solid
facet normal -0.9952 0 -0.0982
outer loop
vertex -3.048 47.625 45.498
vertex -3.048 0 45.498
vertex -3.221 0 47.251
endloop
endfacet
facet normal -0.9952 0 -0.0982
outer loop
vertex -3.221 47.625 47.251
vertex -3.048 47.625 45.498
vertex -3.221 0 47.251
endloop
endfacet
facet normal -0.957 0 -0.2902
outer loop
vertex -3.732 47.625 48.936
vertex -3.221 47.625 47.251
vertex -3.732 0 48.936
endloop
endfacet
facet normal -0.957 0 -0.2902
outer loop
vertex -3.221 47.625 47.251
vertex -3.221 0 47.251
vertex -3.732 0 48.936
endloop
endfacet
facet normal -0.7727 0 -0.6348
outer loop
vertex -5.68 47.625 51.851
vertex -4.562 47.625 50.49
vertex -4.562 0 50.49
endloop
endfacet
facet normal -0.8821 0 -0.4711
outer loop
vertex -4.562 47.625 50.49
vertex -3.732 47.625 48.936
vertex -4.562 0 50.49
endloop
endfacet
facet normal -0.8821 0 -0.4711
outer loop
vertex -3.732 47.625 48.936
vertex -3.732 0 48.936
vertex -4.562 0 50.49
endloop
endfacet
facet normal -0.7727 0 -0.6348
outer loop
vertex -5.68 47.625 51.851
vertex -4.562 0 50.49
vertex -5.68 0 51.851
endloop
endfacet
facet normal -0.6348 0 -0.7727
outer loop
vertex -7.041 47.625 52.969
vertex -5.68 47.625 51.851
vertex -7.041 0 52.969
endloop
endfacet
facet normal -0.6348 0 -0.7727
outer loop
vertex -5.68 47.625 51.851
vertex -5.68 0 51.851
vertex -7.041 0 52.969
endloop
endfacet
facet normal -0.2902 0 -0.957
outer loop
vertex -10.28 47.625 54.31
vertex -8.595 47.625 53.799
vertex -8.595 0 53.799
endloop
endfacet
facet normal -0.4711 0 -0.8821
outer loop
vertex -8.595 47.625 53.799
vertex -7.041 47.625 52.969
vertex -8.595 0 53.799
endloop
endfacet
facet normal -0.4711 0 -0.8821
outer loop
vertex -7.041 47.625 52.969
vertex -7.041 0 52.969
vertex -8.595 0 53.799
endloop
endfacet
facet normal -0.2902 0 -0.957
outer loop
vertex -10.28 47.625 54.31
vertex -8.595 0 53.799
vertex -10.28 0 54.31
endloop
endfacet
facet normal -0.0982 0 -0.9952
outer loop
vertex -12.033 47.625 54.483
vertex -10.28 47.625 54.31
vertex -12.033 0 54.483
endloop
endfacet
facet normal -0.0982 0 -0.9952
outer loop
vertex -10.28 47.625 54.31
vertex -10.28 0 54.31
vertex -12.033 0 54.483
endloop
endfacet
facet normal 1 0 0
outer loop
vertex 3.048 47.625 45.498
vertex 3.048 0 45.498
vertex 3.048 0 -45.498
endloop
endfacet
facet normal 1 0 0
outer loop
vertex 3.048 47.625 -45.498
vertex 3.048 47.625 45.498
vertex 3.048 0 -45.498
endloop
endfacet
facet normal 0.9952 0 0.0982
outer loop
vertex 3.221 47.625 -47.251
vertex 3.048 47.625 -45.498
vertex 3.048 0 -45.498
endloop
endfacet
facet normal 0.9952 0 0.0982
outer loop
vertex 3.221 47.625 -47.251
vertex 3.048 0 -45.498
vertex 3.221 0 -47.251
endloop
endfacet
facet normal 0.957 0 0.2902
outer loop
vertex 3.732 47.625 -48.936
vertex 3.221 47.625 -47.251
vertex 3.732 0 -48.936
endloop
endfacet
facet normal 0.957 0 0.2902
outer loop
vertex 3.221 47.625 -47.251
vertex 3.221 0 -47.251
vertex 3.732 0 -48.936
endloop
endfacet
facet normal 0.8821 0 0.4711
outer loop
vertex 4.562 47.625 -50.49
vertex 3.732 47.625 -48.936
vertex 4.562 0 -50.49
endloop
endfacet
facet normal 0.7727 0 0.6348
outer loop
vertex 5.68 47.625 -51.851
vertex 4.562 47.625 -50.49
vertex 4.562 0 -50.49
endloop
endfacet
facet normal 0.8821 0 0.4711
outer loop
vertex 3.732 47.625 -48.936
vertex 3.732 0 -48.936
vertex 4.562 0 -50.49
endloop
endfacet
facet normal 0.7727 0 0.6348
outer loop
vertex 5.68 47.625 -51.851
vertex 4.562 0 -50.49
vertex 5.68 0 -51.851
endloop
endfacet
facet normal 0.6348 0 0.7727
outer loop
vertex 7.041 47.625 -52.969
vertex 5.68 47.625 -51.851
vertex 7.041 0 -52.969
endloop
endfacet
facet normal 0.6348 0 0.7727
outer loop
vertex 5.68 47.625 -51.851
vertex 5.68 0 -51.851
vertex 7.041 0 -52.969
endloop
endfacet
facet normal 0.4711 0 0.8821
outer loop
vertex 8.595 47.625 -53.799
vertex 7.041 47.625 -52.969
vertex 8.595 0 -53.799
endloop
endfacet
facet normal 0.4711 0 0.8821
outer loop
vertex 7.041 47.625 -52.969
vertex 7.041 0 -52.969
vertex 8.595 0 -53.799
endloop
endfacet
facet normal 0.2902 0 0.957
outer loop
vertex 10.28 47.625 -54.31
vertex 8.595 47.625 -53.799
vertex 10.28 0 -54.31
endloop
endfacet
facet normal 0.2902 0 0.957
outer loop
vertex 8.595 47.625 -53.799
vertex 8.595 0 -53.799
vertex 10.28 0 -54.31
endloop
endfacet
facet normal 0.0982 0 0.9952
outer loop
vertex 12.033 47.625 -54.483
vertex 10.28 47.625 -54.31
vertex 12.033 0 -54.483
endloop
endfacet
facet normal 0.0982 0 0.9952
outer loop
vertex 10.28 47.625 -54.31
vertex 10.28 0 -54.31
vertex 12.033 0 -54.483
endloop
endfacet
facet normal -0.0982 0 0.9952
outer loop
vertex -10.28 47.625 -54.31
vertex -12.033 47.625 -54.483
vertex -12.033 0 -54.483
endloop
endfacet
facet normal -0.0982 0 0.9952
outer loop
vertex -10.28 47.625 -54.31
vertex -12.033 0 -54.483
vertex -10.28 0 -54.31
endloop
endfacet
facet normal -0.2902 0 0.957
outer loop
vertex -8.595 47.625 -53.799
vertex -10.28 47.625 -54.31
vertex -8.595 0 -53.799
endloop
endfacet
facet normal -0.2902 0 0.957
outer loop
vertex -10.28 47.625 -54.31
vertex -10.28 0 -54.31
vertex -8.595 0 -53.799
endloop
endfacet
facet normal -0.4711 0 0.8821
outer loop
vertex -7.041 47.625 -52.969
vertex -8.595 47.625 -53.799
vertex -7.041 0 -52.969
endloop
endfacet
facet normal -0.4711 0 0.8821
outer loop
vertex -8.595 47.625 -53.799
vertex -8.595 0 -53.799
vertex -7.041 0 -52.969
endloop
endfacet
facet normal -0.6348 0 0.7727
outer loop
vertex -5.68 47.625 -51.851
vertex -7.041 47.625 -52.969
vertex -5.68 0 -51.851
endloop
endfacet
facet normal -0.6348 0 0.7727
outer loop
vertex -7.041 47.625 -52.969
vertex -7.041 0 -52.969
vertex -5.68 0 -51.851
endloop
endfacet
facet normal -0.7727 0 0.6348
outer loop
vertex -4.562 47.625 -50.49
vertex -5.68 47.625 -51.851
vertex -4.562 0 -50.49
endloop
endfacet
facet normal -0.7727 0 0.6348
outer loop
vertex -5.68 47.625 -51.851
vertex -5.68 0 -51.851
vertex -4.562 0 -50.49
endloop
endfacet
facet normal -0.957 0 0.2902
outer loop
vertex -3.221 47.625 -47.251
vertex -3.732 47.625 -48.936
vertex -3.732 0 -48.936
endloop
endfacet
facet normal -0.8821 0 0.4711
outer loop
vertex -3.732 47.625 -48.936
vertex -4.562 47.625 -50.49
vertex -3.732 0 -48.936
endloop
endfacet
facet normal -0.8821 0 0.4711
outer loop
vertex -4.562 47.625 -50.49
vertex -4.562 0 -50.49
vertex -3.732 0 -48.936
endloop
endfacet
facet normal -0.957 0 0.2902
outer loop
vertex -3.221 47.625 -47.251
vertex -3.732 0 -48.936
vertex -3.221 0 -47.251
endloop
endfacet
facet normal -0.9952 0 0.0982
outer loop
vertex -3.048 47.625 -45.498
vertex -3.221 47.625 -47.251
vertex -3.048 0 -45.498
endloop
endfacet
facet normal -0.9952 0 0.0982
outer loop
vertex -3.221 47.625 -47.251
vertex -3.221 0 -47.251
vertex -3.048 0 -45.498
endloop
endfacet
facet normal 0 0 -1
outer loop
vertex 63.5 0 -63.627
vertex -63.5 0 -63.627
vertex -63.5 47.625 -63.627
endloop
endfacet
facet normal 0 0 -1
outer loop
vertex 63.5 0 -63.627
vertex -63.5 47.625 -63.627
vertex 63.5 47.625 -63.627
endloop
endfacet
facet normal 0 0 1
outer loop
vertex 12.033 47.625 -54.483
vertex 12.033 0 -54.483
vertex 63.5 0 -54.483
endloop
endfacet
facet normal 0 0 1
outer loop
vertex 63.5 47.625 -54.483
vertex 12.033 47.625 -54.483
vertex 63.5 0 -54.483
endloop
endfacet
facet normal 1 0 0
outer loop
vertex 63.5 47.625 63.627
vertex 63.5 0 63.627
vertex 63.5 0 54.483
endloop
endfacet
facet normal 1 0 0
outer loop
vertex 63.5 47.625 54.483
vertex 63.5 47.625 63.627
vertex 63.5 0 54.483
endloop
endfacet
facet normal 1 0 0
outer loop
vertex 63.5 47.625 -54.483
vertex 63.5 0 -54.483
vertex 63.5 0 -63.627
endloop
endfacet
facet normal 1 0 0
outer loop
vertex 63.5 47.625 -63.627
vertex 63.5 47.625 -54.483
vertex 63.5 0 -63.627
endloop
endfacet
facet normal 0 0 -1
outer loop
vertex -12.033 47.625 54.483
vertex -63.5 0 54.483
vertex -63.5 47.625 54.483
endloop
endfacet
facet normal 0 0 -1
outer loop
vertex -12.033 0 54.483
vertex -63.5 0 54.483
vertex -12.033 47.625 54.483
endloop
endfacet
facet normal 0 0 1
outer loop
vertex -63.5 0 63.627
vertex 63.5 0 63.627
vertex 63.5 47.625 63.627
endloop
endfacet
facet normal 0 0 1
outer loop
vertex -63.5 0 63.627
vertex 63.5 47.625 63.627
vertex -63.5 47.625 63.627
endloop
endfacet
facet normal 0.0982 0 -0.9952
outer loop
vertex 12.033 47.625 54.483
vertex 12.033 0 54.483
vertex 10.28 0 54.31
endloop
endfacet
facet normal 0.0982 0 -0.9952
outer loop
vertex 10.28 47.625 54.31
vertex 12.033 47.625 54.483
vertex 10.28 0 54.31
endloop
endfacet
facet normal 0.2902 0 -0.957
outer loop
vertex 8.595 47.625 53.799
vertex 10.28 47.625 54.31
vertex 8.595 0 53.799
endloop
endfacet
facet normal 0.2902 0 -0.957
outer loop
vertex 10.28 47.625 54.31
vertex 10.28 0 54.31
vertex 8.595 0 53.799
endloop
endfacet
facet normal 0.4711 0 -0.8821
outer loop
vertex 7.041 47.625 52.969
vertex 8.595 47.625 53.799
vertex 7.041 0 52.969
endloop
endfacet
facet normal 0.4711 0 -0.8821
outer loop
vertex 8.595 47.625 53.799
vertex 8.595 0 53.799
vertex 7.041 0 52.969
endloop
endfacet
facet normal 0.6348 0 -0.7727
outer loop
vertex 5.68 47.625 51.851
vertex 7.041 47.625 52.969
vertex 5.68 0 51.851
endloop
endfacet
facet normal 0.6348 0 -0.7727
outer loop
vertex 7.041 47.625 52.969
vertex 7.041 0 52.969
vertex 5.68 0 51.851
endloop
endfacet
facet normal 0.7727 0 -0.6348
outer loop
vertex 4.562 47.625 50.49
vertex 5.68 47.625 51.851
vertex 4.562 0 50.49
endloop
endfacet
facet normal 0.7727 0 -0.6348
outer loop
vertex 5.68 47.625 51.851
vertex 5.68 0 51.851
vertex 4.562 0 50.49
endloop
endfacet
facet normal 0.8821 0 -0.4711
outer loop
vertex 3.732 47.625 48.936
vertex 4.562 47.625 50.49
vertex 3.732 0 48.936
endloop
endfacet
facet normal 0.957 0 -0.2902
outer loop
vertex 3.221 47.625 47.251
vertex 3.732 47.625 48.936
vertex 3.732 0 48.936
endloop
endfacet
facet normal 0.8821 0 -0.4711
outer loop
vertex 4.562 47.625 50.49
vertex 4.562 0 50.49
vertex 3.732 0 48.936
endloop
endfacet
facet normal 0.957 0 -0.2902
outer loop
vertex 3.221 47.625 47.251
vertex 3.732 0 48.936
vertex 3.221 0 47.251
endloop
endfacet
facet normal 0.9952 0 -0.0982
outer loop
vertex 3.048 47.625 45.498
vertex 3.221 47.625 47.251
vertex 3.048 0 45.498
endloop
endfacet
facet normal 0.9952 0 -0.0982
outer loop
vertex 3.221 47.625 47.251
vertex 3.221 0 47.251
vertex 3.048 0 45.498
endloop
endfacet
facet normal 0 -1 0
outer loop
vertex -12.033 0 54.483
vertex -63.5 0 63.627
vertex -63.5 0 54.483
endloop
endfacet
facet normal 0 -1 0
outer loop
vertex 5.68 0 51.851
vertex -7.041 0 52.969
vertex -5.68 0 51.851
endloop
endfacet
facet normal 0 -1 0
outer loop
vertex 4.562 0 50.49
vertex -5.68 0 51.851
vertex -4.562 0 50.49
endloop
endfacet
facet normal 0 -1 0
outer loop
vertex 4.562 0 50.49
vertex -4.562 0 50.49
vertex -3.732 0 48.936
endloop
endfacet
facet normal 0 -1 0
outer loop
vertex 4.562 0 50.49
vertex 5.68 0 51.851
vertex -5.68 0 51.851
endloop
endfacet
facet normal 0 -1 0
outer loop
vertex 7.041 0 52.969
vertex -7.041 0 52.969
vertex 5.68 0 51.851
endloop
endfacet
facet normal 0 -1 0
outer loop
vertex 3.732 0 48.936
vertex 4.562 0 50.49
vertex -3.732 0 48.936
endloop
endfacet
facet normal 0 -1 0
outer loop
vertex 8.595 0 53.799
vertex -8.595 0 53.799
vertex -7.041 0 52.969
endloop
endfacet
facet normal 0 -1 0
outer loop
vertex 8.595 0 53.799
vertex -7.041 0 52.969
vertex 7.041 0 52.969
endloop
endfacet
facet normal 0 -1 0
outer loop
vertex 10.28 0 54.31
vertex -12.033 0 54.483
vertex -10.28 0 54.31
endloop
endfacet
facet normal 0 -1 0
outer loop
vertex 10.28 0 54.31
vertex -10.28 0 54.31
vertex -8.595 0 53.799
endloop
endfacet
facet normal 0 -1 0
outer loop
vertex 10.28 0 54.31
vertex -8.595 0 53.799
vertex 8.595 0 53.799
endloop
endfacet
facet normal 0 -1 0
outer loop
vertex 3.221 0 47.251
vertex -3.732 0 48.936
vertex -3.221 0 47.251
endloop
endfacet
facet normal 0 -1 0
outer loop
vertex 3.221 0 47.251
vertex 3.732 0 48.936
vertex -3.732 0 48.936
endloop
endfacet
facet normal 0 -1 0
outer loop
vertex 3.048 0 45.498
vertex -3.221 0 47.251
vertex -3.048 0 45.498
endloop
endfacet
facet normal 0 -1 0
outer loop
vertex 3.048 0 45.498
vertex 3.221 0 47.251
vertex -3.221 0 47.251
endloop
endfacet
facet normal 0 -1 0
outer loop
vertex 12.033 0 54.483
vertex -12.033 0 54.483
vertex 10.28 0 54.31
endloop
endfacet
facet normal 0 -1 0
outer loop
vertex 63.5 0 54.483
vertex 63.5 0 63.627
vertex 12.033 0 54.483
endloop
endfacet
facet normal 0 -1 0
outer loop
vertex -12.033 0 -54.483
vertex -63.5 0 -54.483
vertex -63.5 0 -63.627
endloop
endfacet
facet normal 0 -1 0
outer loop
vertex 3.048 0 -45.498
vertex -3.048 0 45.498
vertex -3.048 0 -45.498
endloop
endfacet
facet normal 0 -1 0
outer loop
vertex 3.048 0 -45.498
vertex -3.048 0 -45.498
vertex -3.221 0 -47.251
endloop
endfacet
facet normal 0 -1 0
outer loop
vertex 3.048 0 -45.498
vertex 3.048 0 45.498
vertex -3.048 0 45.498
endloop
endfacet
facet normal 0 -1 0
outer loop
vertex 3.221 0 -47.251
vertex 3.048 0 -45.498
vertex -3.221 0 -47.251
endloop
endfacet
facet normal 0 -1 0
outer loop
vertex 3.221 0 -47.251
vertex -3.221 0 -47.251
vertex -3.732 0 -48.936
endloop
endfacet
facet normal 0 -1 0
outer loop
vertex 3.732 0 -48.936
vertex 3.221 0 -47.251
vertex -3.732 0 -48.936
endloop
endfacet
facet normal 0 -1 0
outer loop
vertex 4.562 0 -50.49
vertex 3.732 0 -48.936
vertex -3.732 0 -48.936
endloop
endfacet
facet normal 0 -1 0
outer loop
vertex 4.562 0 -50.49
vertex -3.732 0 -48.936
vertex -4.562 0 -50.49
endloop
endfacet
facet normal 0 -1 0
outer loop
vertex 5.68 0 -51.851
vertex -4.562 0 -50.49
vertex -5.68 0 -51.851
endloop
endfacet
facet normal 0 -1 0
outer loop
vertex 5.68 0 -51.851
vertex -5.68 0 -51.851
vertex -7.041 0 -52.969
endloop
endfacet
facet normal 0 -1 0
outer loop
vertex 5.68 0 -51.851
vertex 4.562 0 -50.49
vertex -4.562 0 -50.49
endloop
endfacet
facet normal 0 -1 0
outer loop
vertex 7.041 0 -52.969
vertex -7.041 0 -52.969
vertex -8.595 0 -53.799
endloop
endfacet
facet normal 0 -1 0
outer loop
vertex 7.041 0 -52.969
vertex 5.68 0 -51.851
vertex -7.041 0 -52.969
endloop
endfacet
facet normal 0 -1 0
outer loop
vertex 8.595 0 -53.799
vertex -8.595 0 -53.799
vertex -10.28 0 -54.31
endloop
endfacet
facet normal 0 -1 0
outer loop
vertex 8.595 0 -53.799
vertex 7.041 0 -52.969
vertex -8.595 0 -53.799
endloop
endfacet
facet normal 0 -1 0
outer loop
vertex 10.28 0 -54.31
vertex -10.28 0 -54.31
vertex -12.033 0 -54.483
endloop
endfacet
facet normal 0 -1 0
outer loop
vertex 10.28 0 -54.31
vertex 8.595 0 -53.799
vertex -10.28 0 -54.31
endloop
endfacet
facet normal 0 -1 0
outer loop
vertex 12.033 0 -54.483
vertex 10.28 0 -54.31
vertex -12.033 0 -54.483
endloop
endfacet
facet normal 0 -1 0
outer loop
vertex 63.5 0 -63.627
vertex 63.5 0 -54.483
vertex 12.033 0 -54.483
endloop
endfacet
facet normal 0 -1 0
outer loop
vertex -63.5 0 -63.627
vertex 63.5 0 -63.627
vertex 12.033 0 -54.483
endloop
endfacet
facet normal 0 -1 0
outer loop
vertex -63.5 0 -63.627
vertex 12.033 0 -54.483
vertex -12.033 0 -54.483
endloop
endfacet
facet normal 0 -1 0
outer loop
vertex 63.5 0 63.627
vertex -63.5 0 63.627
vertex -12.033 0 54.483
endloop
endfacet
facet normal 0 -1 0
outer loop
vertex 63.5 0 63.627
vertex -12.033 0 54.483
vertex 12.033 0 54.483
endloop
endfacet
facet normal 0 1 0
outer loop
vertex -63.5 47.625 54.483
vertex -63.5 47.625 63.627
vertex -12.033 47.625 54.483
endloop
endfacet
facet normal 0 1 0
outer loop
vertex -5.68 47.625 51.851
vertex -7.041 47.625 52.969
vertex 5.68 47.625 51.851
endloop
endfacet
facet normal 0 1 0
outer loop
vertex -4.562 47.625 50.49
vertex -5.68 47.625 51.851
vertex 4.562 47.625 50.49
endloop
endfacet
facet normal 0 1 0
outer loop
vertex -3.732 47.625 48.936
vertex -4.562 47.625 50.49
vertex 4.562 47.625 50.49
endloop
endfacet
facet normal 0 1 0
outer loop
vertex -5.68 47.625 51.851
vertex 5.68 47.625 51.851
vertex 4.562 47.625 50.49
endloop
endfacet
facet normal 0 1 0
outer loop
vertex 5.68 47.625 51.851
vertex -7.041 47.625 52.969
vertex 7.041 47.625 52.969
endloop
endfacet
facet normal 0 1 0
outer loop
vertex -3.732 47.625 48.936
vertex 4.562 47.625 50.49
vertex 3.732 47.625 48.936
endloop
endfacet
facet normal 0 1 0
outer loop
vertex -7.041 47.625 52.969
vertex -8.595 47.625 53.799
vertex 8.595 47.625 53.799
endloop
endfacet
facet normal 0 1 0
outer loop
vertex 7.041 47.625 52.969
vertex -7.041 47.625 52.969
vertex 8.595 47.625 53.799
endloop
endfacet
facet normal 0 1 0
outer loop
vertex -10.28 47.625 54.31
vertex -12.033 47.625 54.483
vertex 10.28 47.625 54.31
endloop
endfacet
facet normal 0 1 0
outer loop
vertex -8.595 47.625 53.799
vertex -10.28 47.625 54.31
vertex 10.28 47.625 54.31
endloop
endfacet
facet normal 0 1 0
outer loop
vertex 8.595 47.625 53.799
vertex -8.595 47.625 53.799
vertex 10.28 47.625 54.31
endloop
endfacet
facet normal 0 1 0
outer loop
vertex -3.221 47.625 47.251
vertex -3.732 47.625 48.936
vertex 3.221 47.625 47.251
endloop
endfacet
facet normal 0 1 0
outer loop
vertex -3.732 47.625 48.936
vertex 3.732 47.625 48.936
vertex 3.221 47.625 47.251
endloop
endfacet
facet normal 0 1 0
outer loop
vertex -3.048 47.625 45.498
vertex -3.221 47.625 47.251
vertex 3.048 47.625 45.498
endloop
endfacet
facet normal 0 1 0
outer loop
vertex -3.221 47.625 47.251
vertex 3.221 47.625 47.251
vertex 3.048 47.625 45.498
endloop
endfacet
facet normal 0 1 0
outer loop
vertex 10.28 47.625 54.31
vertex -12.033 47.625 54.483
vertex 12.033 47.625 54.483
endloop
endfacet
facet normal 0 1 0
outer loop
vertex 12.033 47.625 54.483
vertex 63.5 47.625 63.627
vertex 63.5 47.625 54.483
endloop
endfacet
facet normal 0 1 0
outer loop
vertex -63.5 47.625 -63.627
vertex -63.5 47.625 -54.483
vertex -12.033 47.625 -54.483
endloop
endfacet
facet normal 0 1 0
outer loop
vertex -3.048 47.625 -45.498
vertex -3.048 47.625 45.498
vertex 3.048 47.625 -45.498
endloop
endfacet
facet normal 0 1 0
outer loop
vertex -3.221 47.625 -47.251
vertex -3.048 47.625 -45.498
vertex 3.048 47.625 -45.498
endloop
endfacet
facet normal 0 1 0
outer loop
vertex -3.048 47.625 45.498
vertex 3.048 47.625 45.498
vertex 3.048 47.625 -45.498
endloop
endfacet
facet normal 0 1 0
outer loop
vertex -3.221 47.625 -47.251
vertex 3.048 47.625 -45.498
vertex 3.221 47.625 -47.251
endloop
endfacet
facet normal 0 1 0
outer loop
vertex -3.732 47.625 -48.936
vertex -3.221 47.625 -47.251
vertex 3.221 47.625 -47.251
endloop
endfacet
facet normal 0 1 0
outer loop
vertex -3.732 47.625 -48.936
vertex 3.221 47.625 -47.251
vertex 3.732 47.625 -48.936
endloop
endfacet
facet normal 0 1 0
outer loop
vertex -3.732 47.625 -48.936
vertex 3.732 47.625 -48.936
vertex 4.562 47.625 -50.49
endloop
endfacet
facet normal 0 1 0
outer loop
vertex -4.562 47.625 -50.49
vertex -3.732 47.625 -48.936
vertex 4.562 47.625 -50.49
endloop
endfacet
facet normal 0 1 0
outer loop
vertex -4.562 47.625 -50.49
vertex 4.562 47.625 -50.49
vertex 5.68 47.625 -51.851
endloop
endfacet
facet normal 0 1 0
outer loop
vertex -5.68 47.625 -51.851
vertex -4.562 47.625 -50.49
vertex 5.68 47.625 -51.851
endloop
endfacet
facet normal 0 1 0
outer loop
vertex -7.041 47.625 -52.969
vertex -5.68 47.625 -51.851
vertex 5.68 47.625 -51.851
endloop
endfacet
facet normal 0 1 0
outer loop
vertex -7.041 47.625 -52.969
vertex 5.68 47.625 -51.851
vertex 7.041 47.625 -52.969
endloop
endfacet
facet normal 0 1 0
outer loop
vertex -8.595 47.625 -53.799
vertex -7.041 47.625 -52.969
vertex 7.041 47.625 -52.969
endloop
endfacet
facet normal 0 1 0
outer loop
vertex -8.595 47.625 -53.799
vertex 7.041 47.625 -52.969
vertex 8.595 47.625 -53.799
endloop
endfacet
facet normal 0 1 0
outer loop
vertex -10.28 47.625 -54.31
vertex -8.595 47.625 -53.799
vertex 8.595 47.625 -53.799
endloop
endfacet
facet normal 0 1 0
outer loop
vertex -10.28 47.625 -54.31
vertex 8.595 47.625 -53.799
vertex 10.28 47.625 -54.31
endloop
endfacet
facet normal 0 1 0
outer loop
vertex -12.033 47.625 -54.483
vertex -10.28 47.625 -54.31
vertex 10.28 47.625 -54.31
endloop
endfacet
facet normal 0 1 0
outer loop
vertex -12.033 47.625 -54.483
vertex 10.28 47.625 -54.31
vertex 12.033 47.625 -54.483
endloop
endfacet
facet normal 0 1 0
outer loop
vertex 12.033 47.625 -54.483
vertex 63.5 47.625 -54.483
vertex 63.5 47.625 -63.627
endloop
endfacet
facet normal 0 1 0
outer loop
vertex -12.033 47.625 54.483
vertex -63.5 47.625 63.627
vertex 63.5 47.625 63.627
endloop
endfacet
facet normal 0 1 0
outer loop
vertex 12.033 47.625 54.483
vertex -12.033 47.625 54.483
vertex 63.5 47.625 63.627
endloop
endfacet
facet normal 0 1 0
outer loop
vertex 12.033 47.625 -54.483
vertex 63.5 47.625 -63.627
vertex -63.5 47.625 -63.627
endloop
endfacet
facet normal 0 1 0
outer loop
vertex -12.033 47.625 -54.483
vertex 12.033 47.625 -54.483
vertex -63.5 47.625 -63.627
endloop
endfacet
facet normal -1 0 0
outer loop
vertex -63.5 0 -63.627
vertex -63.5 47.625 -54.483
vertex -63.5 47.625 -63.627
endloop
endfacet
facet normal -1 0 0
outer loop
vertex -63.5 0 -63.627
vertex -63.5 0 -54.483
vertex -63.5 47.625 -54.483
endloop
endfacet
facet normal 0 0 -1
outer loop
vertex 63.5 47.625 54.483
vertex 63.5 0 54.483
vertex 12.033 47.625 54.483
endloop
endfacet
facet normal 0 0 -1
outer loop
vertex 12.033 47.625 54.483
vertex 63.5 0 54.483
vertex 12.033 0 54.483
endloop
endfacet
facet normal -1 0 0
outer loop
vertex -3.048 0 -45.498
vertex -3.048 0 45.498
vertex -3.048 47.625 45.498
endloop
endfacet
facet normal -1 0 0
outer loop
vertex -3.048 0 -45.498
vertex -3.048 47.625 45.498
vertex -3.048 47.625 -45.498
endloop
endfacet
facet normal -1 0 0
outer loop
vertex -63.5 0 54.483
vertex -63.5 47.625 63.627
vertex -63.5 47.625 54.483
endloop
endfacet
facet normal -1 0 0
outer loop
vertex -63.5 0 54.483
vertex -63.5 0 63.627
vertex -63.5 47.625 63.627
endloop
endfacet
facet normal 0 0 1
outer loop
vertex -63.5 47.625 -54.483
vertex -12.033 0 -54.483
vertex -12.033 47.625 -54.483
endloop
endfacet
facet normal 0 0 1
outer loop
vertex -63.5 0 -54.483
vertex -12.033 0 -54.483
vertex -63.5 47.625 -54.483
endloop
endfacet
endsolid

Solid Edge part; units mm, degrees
sketch "Sketch1" plane through (0, 0, 0) normal (0, -1, 0) x (1, 0, 0)
  line L0 (63.5, 63.627) -> (-63.5, 63.627)
  line L1 (-63.5, 63.627) -> (-63.5, 54.483)
  line L2 (-63.5, 54.483) -> (-12.0332, 54.483)
  arc A0 (-12.0332, 54.483) -> (-3.048, 45.4977) centre (-12.0332, 45.4977) cw
  line L3 (-3.048, 45.4977) -> (-3.048, -45.4977)
  arc A1 (-3.048, -45.4977) -> (-12.0332, -54.483) centre (-12.0332, -45.4977) cw
  line L4 (-12.0332, -54.483) -> (-63.5, -54.483)
  line L5 (-63.5, -54.483) -> (-63.5, -63.627)
  line L6 (-63.5, -63.627) -> (63.5, -63.627)
  line L7 (63.5, -54.483) -> (63.5, -63.627)
  line L8 (12.0332, -54.483) -> (63.5, -54.483)
  arc A2 (3.048, -45.4977) -> (12.0332, -54.483) centre (12.0332, -45.4977) ccw
  line L9 (3.048, 45.4977) -> (3.048, -45.4977)
  arc A3 (12.0332, 54.483) -> (3.048, 45.4977) centre (12.0332, 45.4977) ccw
  line L10 (63.5, 54.483) -> (12.0332, 54.483)
  line L11 (63.5, 63.627) -> (63.5, 54.483)
  dimension "D1" = 9.144
  dimension "D2" = 127.254
  dimension "D3" = 127
extrude "Protrusion1" add sketch "Sketch1" against normal blind 47.625
